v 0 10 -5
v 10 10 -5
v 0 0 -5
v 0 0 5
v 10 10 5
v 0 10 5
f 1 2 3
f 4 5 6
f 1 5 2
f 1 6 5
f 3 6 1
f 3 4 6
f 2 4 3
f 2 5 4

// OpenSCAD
linear_extrude(height = 10, center = true, convexity = 10, twist = 0)polygon( points=[[0, 0], [0, 10], [10, 10], ] );
